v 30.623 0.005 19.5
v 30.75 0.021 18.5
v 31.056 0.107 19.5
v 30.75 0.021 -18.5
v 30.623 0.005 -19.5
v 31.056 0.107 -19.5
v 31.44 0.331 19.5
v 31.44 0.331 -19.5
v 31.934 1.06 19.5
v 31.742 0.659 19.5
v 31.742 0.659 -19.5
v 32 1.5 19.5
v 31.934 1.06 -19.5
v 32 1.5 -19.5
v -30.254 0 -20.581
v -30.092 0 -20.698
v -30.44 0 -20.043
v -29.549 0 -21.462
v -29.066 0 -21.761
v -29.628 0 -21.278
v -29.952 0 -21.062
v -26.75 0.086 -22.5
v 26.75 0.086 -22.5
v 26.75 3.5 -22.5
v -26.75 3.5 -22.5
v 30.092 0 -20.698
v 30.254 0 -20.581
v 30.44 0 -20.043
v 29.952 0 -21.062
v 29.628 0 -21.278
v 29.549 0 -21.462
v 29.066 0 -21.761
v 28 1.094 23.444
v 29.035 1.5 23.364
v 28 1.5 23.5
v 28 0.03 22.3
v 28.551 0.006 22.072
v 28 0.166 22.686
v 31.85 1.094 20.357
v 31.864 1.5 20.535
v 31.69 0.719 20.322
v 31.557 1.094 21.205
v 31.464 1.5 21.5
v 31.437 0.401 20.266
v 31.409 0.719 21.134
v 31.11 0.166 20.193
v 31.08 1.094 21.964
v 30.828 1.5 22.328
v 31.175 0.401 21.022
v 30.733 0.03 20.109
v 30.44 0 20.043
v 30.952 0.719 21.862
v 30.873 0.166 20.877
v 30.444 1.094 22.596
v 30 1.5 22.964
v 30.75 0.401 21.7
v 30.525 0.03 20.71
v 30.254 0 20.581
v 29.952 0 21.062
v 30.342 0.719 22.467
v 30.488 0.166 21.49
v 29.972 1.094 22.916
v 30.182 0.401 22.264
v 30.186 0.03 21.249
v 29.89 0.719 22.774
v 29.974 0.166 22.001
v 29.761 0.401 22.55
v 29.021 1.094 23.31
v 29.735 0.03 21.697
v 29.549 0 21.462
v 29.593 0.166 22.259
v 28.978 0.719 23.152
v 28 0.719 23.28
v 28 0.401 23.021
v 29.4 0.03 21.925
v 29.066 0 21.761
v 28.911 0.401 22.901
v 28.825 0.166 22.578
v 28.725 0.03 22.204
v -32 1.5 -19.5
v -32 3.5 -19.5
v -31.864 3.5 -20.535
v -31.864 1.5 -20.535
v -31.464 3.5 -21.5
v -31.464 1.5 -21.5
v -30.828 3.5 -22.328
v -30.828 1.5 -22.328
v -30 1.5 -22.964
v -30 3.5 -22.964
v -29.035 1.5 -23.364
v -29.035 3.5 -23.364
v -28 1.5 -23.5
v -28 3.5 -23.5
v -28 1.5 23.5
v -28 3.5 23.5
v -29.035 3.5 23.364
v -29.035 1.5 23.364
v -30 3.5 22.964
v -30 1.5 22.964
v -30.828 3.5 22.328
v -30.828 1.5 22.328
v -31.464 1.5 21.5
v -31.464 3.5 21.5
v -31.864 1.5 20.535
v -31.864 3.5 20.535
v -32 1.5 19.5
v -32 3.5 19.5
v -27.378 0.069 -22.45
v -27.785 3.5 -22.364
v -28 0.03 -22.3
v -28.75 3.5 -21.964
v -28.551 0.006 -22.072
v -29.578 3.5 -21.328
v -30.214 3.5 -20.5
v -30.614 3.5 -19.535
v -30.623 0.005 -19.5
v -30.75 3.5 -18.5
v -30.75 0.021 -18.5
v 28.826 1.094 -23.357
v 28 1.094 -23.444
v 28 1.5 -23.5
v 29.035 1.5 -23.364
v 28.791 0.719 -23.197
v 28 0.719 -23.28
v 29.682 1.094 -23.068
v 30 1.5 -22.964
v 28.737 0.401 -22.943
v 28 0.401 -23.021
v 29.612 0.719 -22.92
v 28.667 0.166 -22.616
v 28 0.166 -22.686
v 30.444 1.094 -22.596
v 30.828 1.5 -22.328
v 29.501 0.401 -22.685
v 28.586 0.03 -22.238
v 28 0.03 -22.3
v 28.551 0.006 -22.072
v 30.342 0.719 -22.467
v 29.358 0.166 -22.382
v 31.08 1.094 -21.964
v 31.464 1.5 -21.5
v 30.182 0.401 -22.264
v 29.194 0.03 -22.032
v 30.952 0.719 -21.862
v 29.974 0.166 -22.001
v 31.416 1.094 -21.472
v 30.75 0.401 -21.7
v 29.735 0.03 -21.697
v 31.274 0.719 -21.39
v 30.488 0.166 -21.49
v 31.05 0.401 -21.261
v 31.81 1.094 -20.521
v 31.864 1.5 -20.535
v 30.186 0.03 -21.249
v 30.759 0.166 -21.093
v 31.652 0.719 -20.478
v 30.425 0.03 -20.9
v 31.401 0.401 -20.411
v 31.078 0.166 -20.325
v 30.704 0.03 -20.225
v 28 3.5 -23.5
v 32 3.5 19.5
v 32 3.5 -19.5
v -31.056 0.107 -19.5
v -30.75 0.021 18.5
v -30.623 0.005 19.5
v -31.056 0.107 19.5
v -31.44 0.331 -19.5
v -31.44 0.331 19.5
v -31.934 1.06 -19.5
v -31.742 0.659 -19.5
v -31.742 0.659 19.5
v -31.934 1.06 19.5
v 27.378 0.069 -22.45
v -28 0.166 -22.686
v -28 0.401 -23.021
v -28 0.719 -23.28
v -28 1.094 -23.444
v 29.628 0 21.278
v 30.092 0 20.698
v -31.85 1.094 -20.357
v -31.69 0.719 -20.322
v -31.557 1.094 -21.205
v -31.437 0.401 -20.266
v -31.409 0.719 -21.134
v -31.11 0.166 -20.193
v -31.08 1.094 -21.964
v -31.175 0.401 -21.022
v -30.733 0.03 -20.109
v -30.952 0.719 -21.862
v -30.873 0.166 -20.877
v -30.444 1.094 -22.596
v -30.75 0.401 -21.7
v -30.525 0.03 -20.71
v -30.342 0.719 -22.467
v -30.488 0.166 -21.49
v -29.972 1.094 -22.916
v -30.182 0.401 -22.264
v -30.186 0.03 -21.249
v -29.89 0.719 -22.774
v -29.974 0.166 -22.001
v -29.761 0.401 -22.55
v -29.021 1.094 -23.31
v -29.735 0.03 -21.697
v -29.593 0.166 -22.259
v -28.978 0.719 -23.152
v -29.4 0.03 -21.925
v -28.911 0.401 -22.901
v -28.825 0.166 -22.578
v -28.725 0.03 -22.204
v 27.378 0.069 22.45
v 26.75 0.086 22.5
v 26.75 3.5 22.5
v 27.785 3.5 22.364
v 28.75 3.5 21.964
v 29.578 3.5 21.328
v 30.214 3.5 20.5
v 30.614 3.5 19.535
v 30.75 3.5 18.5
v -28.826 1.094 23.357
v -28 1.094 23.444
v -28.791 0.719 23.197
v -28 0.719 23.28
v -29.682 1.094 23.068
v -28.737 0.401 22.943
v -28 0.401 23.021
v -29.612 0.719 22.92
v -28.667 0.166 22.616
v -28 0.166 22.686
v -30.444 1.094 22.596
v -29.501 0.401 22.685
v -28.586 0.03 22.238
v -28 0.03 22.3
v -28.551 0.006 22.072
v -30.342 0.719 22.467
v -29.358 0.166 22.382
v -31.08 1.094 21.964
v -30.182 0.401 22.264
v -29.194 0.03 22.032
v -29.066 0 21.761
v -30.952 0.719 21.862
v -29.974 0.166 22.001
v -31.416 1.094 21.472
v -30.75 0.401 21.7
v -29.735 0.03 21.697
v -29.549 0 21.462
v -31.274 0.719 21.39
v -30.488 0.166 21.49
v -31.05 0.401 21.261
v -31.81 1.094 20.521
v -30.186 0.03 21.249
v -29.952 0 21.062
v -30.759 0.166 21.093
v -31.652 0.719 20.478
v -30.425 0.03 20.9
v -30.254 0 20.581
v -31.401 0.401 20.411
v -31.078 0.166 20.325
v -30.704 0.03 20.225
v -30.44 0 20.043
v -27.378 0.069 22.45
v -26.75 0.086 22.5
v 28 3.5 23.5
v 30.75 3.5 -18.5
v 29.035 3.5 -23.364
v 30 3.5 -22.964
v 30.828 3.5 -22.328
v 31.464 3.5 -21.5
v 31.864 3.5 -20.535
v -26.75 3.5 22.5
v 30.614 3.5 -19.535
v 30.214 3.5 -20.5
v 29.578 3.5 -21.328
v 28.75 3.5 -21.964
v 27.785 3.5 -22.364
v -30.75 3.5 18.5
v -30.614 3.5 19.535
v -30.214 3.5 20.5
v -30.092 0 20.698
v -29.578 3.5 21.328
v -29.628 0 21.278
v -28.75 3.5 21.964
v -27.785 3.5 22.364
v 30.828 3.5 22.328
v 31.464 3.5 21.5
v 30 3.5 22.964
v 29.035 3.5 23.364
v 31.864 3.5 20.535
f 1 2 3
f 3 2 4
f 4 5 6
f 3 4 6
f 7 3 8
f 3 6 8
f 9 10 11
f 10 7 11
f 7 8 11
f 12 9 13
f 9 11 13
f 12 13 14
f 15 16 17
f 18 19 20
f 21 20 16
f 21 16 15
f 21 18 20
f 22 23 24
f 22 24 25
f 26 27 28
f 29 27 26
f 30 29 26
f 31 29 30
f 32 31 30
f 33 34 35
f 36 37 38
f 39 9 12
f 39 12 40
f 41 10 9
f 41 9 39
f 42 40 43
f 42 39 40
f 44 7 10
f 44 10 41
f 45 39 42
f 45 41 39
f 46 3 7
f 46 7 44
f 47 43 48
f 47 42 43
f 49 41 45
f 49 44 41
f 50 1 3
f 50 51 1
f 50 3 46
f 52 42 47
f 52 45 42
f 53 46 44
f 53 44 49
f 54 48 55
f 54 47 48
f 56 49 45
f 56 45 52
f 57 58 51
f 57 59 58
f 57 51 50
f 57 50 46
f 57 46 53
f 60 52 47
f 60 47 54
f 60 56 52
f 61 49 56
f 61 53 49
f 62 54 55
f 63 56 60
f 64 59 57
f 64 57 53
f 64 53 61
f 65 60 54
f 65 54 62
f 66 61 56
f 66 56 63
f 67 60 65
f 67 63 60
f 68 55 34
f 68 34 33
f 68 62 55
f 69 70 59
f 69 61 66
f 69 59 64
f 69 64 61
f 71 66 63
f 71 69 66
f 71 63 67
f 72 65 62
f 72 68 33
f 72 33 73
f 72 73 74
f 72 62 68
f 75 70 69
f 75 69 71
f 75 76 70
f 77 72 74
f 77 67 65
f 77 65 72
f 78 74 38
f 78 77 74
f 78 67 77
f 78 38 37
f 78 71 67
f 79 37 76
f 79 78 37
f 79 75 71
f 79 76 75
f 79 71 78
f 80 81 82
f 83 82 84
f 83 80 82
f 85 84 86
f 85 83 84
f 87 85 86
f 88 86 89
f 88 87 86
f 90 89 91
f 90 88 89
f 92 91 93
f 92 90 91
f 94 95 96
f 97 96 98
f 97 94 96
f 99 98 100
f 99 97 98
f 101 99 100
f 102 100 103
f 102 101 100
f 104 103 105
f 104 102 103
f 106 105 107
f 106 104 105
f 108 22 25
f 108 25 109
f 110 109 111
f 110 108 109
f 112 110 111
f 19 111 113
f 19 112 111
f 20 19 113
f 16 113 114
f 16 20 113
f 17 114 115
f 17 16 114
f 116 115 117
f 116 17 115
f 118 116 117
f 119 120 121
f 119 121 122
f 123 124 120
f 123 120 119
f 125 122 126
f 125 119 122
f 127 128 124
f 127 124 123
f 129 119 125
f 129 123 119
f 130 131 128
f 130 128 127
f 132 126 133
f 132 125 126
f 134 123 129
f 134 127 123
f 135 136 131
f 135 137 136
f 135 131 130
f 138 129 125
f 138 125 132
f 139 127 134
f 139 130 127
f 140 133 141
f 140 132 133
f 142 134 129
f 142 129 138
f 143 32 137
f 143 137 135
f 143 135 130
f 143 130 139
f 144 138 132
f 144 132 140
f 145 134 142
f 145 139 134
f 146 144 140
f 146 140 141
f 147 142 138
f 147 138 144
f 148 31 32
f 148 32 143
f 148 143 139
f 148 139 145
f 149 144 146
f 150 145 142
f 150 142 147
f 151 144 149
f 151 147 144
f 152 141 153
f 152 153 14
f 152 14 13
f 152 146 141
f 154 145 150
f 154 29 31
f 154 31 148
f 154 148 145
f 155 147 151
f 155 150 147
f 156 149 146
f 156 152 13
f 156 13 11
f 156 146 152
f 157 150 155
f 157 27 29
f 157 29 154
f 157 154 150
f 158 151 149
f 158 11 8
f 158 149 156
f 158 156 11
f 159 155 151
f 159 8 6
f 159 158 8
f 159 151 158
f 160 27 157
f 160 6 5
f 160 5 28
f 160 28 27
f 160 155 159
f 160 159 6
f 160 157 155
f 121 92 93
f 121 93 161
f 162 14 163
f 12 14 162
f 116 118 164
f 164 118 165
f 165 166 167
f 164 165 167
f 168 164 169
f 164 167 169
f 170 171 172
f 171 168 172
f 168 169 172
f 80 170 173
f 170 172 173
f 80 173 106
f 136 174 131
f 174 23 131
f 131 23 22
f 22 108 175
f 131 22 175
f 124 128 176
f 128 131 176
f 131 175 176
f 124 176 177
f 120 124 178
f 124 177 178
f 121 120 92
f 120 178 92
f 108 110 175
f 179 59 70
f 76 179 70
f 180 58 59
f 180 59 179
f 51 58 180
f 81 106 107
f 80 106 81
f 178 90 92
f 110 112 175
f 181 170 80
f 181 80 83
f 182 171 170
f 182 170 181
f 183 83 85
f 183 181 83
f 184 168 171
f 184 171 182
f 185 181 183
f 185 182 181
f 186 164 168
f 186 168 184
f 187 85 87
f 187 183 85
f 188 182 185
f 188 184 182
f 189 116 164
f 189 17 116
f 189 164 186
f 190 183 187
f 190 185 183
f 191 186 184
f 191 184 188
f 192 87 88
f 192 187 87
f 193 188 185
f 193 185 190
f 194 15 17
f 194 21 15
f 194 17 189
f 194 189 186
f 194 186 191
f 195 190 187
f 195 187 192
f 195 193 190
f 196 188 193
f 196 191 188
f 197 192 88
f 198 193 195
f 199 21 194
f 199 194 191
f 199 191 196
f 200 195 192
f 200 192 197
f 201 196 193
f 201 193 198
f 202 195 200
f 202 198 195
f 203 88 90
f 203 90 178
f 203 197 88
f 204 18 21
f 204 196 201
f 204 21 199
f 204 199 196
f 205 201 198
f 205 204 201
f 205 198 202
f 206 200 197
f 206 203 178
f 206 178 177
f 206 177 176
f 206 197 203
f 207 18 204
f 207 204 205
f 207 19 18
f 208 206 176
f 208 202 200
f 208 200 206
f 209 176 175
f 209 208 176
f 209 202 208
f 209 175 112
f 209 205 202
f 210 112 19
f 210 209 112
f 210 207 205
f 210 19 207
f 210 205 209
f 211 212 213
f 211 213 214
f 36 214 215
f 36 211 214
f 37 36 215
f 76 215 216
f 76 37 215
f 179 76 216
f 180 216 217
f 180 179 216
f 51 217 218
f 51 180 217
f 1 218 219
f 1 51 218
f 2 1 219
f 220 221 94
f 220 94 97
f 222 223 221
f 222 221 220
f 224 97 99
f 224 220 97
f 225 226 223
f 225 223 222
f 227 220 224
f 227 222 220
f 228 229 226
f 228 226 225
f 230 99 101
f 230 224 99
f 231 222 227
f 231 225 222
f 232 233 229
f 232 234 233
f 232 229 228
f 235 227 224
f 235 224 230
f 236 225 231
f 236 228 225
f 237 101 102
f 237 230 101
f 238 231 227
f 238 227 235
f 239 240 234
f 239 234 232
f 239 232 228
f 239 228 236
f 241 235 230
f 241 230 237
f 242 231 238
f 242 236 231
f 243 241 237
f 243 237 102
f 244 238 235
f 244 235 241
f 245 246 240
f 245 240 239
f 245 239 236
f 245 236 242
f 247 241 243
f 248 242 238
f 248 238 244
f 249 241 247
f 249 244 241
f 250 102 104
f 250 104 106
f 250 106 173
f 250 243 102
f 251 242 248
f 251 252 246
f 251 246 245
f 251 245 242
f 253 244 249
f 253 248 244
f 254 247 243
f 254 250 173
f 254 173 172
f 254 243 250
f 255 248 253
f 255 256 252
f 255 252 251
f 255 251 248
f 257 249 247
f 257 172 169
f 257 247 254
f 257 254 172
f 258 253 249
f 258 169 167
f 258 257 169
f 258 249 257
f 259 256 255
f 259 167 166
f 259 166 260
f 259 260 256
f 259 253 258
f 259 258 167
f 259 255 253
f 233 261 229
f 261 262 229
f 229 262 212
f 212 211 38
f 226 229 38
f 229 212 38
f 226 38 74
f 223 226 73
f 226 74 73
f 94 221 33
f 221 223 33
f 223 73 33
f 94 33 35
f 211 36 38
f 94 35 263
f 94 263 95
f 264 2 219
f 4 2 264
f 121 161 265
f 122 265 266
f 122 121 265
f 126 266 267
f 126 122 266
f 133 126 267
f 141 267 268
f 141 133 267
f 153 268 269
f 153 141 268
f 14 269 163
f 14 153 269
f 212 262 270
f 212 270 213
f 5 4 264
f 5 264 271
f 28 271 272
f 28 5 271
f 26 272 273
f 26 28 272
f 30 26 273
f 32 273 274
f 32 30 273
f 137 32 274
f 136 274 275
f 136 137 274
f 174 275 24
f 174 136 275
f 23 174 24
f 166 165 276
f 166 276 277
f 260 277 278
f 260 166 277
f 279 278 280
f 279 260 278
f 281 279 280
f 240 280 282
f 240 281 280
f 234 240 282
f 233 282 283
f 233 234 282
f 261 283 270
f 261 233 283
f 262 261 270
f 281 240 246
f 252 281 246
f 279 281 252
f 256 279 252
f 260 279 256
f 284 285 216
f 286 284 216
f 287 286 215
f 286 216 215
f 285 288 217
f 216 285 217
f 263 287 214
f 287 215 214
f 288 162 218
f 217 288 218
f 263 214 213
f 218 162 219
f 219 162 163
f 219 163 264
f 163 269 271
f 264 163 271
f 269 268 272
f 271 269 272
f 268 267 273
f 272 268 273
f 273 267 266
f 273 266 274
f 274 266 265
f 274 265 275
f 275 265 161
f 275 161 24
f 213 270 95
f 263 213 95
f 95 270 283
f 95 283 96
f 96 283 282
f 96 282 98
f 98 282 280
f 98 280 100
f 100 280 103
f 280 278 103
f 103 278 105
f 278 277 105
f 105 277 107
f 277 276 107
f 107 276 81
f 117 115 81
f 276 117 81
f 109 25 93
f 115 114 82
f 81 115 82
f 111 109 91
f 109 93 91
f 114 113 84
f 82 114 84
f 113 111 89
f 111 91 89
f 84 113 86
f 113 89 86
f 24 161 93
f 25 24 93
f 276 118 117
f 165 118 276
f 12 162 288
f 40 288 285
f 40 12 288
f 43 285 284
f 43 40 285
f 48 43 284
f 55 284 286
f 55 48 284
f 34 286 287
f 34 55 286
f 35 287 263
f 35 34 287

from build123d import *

# Parameters (mm, degrees)
BOSS_EXTRUDE1_DEPTH = 3.5
FILLET2_R           = 1.5


with BuildPart() as part:
    # Sketch1 → Boss-Extrude1 (new body)
    with BuildSketch(Plane(origin=(0, 0, 0), x_dir=(1, 0, 0), z_dir=(0, 1, 0))):
        with BuildLine():
            Line((-28, 23.5), (28, 23.5))
            ThreePointArc((28, 23.5), (30.828427125, 22.328427125), (32, 19.5))
            Line((32, 19.5), (32, -19.5))
            ThreePointArc((32, -19.5), (30.828427125, -22.328427125), (28, -23.5))
            Line((28, -23.5), (-28, -23.5))
            ThreePointArc((-28, -23.5), (-30.828427125, -22.328427125), (-32, -19.5))
            Line((-32, -19.5), (-32, 19.5))
            ThreePointArc((-32, 19.5), (-30.828427125, 22.328427125), (-28, 23.5))
        make_face()
        with BuildLine():
            Line((-26.75, -22.5), (26.75, -22.5))
            ThreePointArc((26.75, -22.5), (29.578427125, -21.328427125), (30.75, -18.5))
            Line((30.75, -18.5), (30.75, 18.5))
            ThreePointArc((30.75, 18.5), (29.578427125, 21.328427125), (26.75, 22.5))
            Line((26.75, 22.5), (-26.75, 22.5))
            ThreePointArc((-26.75, 22.5), (-29.578427125, 21.328427125), (-30.75, 18.5))
            Line((-30.75, 18.5), (-30.75, -18.5))
            ThreePointArc((-30.75, -18.5), (-29.578427125, -21.328427125), (-26.75, -22.5))
        make_face(mode=Mode.SUBTRACT)
    extrude(amount=BOSS_EXTRUDE1_DEPTH)

    # Fillet2
    # the kernel refuses this fillet: 1.5 mm, written as the material it takes off along each edge
    with BuildSketch(Plane(origin=(-28, 0, -19.5), x_dir=(-1, 0, 0), z_dir=(0, 0, 1))) as fillet2_piece_1:
        with BuildLine():
            CenterArc((4 - FILLET2_R, -FILLET2_R), FILLET2_R, 0, 90)
            Line((4 - FILLET2_R, 0), (4, 0))
            Line((4, 0), (4, -FILLET2_R))
        make_face()
    revolve(axis=Axis((-28, 0, -19.5), (0, -1, 0)), revolution_arc=90, mode=Mode.SUBTRACT)
    with BuildSketch(Plane(origin=(28, 0, -19.5), x_dir=(0, 0, -1), z_dir=(-1, 0, 0))) as fillet2_piece_2:
        with BuildLine():
            CenterArc((4 - FILLET2_R, -FILLET2_R), FILLET2_R, 0, 90)
            Line((4 - FILLET2_R, 0), (4, 0))
            Line((4, 0), (4, -FILLET2_R))
        make_face()
    revolve(axis=Axis((28, 0, -19.5), (0, -1, 0)), revolution_arc=90, mode=Mode.SUBTRACT)
    with BuildSketch(Plane(origin=(28, 0, 19.5), x_dir=(1, 0, 0), z_dir=(0, 0, -1))) as fillet2_piece_3:
        with BuildLine():
            CenterArc((4 - FILLET2_R, -FILLET2_R), FILLET2_R, 0, 90)
            Line((4 - FILLET2_R, 0), (4, 0))
            Line((4, 0), (4, -FILLET2_R))
        make_face()
    revolve(axis=Axis((28, 0, 19.5), (0, -1, 0)), revolution_arc=90, mode=Mode.SUBTRACT)
    with BuildSketch(Plane(origin=(-28, 0, 19.5), x_dir=(0, 0, 1), z_dir=(1, 0, 0))) as fillet2_piece_4:
        with BuildLine():
            CenterArc((4 - FILLET2_R, -FILLET2_R), FILLET2_R, 0, 90)
            Line((4 - FILLET2_R, 0), (4, 0))
            Line((4, 0), (4, -FILLET2_R))
        make_face()
    revolve(axis=Axis((-28, 0, 19.5), (0, -1, 0)), revolution_arc=90, mode=Mode.SUBTRACT)
    with BuildSketch(Plane(origin=(28, 0, 23.5), x_dir=(0, 1, 0), z_dir=(-1, 0, 0)), Plane(origin=(-28, 0, -23.5), x_dir=(0, 1, 0), z_dir=(1, 0, 0))) as fillet2_piece_5:
        with BuildLine():
            CenterArc((FILLET2_R, FILLET2_R), FILLET2_R, 180, 90)
            Line((0, FILLET2_R), (0, 0))
            Line((0, 0), (FILLET2_R, 0))
        make_face()
    extrude(amount=56, mode=Mode.SUBTRACT)
    with BuildSketch(Plane(origin=(-32, 0, 19.5), x_dir=(0, 1, 0), z_dir=(0, 0, -1)), Plane(origin=(32, 0, -19.5), x_dir=(0, 1, 0), z_dir=(0, 0, 1))) as fillet2_piece_6:
        with BuildLine():
            CenterArc((FILLET2_R, FILLET2_R), FILLET2_R, 180, 90)
            Line((0, FILLET2_R), (0, 0))
            Line((0, 0), (FILLET2_R, 0))
        make_face()
    extrude(amount=39, mode=Mode.SUBTRACT)


solid = part.part
